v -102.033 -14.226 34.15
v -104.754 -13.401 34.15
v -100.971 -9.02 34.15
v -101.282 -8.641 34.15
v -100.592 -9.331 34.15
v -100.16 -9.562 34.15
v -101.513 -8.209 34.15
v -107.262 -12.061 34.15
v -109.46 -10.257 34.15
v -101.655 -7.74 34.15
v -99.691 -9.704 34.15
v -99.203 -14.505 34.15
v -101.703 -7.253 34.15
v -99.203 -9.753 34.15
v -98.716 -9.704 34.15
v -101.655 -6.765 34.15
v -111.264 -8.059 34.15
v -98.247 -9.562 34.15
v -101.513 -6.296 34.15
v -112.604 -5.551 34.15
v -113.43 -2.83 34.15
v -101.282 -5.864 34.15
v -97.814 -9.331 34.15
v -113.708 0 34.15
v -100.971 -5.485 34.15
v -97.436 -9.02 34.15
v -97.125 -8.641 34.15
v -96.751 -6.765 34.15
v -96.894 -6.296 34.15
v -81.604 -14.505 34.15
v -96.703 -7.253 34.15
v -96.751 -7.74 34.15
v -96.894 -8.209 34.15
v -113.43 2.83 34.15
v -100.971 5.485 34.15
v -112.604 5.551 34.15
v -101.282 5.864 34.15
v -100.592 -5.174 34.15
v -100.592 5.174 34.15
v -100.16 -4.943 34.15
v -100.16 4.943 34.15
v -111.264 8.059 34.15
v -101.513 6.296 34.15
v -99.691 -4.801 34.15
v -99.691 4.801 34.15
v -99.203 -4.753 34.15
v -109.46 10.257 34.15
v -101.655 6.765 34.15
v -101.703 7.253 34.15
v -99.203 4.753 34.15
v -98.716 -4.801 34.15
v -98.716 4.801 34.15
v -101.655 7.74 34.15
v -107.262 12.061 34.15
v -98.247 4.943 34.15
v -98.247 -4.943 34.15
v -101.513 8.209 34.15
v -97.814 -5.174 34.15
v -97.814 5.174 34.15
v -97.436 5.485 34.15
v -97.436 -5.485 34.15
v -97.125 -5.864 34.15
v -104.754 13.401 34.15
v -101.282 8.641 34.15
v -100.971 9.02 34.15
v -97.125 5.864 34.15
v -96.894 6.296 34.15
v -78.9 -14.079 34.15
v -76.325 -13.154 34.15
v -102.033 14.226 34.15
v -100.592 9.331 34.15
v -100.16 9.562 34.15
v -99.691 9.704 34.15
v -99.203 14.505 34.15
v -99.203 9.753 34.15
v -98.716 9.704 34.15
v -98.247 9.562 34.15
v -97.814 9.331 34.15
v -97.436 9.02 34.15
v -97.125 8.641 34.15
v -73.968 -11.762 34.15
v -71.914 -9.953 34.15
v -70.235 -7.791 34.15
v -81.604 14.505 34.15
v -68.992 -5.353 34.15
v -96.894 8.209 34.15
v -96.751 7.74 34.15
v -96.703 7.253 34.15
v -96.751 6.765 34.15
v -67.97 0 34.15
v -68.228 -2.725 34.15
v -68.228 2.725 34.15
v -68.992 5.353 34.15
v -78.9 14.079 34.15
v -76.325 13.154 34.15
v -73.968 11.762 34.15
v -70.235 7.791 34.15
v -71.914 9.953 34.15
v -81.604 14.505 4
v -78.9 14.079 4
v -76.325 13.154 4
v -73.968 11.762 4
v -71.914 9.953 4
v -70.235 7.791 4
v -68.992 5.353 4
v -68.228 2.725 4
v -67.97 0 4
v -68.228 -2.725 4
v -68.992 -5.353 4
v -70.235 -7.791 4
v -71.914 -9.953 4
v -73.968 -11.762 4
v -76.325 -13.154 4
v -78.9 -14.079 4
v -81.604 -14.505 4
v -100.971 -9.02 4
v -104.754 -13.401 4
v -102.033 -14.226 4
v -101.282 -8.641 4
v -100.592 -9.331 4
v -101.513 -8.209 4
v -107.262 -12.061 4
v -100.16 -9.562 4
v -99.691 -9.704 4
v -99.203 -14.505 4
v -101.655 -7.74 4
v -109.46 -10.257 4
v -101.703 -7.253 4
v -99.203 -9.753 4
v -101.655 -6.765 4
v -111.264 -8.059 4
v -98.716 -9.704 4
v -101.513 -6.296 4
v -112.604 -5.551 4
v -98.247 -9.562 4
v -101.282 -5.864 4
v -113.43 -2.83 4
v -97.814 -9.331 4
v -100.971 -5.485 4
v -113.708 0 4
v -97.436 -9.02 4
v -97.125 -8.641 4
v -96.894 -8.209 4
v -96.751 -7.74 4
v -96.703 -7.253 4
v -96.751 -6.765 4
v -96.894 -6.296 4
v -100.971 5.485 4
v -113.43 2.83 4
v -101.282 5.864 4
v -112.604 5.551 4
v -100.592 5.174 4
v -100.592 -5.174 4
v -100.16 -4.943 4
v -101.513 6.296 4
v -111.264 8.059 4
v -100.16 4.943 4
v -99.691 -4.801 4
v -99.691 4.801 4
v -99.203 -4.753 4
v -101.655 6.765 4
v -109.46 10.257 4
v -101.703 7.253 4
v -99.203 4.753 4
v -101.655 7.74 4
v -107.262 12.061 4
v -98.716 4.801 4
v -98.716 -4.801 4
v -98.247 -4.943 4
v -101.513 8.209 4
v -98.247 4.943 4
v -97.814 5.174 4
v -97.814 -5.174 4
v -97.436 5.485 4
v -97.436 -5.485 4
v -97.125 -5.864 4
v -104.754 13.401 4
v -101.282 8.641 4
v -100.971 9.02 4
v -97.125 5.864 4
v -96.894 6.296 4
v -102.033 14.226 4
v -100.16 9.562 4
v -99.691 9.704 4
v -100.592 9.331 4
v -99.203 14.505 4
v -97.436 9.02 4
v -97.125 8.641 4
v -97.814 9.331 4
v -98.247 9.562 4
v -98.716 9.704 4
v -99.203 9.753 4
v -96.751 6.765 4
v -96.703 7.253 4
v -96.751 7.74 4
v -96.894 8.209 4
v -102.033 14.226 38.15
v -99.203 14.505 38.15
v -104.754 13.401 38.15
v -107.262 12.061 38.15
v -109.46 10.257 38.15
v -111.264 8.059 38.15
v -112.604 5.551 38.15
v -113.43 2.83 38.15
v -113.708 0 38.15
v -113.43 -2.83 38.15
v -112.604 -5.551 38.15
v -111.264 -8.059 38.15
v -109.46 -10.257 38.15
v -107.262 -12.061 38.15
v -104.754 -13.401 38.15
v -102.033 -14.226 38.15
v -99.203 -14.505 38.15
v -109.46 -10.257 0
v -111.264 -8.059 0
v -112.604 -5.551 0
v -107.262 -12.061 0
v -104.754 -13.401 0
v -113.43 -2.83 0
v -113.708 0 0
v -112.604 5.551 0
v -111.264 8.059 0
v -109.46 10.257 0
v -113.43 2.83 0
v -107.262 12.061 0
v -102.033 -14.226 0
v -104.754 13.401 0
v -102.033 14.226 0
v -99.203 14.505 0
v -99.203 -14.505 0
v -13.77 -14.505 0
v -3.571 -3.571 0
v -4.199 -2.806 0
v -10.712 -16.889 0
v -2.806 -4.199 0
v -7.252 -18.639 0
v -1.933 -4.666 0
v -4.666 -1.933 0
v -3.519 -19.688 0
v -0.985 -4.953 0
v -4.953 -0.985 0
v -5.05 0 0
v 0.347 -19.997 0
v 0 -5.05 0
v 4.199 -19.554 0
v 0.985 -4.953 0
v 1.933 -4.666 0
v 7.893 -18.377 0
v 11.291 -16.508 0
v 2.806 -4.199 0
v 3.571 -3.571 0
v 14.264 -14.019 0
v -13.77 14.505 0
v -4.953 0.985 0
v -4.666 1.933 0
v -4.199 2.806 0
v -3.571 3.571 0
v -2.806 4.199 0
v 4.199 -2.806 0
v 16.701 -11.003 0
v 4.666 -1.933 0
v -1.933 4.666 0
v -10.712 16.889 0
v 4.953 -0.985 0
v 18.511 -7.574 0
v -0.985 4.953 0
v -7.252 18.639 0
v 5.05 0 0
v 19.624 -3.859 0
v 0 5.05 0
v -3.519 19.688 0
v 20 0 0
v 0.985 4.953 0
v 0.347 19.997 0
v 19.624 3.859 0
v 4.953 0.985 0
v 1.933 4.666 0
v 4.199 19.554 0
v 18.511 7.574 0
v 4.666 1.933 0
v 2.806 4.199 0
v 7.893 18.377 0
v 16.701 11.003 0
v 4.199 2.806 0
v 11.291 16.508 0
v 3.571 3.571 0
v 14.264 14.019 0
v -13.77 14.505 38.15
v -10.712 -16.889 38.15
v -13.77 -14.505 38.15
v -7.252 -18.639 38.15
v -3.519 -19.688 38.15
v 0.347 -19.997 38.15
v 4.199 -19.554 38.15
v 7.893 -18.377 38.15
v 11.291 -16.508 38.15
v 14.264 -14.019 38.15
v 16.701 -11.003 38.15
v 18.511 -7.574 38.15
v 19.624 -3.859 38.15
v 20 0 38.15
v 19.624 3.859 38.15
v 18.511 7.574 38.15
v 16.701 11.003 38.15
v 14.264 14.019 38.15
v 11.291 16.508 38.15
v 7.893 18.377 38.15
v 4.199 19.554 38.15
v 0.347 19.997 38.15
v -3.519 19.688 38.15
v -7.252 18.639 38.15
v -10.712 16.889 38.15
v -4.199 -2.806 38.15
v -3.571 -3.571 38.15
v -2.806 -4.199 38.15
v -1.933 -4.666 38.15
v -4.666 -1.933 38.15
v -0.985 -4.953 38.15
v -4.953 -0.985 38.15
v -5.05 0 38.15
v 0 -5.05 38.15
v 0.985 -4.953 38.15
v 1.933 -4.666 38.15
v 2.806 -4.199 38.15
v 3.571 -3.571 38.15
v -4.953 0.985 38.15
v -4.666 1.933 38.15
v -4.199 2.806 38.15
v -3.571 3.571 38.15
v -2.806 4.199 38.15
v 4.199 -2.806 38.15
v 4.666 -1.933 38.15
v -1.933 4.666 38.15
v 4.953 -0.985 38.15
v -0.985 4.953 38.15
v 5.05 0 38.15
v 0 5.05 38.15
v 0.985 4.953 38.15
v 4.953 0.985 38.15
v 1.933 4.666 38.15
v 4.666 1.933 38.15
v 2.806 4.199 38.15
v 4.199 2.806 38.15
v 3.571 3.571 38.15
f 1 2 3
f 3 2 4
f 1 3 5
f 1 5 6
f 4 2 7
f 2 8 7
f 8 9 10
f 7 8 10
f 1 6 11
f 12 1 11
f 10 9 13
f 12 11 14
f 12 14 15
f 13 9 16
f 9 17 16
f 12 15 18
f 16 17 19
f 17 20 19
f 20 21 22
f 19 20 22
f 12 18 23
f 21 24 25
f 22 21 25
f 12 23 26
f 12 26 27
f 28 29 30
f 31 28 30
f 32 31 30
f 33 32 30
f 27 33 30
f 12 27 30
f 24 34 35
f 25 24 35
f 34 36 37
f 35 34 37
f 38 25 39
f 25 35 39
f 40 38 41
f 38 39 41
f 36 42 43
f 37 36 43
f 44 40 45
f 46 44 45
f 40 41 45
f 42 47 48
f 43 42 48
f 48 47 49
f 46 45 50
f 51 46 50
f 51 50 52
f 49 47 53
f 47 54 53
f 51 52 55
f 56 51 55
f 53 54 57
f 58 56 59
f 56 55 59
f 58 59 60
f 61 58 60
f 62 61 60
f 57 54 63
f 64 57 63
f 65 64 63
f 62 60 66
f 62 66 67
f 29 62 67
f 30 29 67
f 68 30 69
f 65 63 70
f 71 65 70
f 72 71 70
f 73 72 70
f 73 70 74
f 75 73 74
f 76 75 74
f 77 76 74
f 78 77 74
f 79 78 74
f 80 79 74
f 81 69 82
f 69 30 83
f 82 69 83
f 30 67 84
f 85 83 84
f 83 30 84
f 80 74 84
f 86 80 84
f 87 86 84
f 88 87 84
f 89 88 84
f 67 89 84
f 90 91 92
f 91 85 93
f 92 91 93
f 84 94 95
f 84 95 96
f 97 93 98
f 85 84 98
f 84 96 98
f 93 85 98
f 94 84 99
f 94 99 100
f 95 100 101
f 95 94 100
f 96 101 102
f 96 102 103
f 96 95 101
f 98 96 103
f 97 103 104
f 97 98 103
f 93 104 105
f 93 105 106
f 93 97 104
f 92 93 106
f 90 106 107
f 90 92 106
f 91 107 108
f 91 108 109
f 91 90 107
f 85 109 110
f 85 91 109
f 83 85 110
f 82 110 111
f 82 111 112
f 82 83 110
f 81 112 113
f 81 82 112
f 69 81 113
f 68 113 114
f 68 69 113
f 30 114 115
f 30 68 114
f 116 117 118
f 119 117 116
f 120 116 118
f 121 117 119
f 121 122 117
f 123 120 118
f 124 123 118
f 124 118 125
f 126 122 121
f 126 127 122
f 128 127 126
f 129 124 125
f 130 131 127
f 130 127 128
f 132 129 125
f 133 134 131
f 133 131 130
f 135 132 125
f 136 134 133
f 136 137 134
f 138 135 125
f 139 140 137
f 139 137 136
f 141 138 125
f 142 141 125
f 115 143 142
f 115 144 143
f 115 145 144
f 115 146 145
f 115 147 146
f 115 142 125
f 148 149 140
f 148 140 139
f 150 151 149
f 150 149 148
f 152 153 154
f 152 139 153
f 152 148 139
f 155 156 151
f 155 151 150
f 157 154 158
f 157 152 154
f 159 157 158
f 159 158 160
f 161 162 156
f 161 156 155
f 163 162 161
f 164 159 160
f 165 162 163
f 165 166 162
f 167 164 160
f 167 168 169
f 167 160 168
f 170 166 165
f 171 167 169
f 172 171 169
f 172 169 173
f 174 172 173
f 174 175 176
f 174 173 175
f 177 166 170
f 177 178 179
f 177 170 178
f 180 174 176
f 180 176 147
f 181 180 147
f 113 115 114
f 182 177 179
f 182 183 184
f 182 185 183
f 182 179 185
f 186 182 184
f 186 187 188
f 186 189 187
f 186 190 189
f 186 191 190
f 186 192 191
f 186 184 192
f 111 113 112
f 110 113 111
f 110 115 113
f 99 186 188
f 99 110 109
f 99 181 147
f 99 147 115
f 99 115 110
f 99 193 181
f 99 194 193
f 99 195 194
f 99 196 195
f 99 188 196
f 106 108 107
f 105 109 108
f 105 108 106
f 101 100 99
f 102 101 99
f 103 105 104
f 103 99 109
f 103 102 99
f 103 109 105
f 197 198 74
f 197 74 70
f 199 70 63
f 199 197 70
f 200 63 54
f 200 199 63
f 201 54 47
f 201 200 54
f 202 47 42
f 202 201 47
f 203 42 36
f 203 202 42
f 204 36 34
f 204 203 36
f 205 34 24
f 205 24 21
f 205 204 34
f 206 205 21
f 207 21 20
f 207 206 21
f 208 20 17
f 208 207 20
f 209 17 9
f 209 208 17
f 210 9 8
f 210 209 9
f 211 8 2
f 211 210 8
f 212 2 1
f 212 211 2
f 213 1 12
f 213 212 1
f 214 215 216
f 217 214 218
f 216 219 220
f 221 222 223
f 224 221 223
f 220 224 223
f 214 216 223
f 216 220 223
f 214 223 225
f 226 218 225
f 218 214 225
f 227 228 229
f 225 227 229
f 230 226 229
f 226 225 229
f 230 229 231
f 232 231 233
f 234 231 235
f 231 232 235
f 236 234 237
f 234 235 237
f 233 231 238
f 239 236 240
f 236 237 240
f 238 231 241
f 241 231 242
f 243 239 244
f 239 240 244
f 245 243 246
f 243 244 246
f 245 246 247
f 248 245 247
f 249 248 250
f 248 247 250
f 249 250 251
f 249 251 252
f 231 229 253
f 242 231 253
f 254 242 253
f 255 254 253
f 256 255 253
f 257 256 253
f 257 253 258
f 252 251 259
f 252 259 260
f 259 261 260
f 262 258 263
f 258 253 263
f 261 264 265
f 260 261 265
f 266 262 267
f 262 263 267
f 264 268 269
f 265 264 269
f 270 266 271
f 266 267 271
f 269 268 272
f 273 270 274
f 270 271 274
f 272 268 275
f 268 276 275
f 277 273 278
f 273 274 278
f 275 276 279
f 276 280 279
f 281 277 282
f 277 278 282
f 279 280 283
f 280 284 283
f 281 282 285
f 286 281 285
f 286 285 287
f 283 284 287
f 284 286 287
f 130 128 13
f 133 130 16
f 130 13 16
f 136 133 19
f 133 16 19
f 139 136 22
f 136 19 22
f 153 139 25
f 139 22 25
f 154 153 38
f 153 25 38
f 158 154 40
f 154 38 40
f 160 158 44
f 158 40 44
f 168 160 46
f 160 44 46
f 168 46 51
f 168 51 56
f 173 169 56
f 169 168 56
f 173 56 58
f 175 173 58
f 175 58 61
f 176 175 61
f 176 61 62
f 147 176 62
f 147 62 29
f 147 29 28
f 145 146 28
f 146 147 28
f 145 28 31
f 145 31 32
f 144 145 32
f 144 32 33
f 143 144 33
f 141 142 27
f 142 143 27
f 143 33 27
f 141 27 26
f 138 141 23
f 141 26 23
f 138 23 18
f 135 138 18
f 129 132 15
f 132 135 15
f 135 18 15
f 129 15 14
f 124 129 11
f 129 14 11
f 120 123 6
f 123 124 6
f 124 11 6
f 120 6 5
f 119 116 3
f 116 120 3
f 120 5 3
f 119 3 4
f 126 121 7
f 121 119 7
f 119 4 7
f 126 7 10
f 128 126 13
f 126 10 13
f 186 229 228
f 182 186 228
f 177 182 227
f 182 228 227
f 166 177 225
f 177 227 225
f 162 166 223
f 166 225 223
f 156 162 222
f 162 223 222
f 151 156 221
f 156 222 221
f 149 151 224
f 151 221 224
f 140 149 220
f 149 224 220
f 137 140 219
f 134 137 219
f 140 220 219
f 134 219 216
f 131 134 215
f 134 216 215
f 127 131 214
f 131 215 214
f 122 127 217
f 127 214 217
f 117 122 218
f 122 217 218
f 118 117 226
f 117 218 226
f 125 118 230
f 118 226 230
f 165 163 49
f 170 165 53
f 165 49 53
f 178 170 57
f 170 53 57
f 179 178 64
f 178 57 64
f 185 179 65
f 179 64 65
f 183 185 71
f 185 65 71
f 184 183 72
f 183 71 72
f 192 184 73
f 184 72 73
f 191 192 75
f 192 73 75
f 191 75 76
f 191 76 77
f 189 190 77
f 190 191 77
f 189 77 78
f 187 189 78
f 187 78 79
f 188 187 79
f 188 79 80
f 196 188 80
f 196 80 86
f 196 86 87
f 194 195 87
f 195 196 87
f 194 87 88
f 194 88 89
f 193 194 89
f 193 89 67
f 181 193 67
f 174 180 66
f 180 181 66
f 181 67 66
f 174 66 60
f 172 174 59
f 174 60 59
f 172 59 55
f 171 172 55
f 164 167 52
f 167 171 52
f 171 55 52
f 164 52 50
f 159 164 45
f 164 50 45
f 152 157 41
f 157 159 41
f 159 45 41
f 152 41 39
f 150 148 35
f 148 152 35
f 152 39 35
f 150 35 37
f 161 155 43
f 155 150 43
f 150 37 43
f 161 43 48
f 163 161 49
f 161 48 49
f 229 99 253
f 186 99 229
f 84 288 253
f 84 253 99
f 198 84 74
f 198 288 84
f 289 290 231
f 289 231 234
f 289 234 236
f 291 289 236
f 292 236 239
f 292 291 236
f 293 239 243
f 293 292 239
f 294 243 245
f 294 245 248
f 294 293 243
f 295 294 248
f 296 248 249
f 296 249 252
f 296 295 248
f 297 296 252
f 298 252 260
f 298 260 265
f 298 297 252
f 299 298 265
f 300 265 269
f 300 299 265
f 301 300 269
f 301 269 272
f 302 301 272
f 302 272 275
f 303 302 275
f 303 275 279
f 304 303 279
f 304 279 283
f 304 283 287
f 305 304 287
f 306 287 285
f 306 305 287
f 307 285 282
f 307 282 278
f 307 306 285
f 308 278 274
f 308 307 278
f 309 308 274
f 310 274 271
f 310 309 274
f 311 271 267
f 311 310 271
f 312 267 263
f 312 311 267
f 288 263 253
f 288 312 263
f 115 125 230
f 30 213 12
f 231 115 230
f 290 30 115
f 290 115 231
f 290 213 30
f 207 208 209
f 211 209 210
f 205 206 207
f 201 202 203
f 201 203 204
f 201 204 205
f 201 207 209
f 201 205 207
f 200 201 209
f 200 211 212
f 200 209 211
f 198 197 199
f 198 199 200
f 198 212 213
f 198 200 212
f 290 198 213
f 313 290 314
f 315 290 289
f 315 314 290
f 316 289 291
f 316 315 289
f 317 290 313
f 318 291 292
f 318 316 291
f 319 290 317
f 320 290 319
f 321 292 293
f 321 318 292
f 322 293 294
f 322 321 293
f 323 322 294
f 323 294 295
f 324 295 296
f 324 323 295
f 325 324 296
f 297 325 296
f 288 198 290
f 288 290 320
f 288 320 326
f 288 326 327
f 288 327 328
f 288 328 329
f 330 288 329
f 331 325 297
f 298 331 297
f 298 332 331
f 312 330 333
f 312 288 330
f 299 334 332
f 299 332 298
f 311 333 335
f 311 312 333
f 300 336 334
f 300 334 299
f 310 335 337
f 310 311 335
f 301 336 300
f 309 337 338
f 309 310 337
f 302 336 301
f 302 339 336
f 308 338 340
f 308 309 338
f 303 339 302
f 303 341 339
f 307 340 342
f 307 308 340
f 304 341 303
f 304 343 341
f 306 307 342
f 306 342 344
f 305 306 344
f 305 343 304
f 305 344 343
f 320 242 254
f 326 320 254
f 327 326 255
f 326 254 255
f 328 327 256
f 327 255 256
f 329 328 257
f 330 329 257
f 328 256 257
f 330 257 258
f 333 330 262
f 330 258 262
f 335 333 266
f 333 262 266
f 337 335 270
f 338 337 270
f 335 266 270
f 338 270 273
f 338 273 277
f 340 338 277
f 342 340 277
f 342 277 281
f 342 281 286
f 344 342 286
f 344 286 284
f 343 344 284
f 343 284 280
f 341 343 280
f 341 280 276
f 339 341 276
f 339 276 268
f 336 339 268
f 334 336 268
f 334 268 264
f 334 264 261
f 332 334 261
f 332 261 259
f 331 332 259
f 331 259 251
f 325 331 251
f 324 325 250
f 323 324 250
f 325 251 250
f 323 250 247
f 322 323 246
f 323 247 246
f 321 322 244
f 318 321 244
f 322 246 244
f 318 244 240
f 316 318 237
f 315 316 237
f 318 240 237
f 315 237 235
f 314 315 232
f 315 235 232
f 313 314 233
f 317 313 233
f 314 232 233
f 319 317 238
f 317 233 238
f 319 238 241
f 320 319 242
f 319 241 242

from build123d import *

# Parameters (mm, degrees)
SKETCH1_R                = 20
SKETCH1_R_2              = 14.505051228
BOSS_EXTRUDE1_DEPTH      = 4
BOSS_EXTRUDE2_DEPTH      = 15.075
SKETCH3_R                = 5.05
CUT_EXTRUDE1_DEPTH       = 51.075
SKETCH4_R                = 2.5
BOSS_EXTRUDE3_DEPTH      = 32
BOSS_EXTRUDE3_DEPTH_BACK = 2


with BuildPart() as part:
    # Sketch1 → Boss-Extrude1 (new body)
    with BuildSketch(Plane.XY):
        Circle(SKETCH1_R)
        with BuildLine():
            Line((-99.203276416, -14.505051228), (-13.76965827, -14.505051228))
            ThreePointArc((-13.76965827, -14.505051228), (-20, 0), (-13.76965827, 14.505051228))
            Line((-13.76965827, 14.505051228), (-99.203276416, 14.505051228))
            ThreePointArc((-99.203276416, 14.505051228), (-88.946656331, 10.256620085), (-84.698225188, 0))
            ThreePointArc((-84.698225188, 0), (-88.946656331, -10.256620085), (-99.203276416, -14.505051228))
        make_face()
        with Locations((-99.203276416, 0)):
            Circle(SKETCH1_R_2)
    extrude(amount=BOSS_EXTRUDE1_DEPTH)

    # Sketch2 → Boss-Extrude2 (add)
    with BuildSketch(Plane.XY.offset(4)):
        with BuildLine():
            Line((-13.76965827, 14.505051228), (-81.604060492, 14.505051228))
            ThreePointArc((-81.604060492, 14.505051228), (-67.970381175, 0), (-81.604060492, -14.505051228))
            Line((-81.604060492, -14.505051228), (-13.76965827, -14.505051228))
            ThreePointArc((-13.76965827, -14.505051228), (20, 0), (-13.76965827, 14.505051228))
        make_face()
    extrude(amount=BOSS_EXTRUDE2_DEPTH)

    # Mirror1: part across plane


with BuildPart() as part_1:
    add(part.part)
    add(part.part.mirror(Plane.XY.offset(19.075)))

    # Sketch3 → Cut-Extrude1 (cut)
    with BuildSketch(Plane(origin=(0, 0, 0), x_dir=(-1, 0, 0), z_dir=(0, 0, -1))):
        Circle(SKETCH3_R)
    extrude(amount=-CUT_EXTRUDE1_DEPTH, mode=Mode.SUBTRACT)

    # Sketch4 → Boss-Extrude3 (add, two sides)
    with BuildSketch(Plane(origin=(0, 0, 34.15), x_dir=(-1, 0, 0), z_dir=(0, 0, -1))) as boss_extrude3_sk:
        with Locations((99.203276416, 7.252525614)):
            Circle(SKETCH4_R)
        with Locations((99.203276416, -7.252525614)):
            Circle(SKETCH4_R)
    extrude(amount=BOSS_EXTRUDE3_DEPTH)
    extrude(boss_extrude3_sk.sketch, amount=-BOSS_EXTRUDE3_DEPTH_BACK)


solid = part_1.part
